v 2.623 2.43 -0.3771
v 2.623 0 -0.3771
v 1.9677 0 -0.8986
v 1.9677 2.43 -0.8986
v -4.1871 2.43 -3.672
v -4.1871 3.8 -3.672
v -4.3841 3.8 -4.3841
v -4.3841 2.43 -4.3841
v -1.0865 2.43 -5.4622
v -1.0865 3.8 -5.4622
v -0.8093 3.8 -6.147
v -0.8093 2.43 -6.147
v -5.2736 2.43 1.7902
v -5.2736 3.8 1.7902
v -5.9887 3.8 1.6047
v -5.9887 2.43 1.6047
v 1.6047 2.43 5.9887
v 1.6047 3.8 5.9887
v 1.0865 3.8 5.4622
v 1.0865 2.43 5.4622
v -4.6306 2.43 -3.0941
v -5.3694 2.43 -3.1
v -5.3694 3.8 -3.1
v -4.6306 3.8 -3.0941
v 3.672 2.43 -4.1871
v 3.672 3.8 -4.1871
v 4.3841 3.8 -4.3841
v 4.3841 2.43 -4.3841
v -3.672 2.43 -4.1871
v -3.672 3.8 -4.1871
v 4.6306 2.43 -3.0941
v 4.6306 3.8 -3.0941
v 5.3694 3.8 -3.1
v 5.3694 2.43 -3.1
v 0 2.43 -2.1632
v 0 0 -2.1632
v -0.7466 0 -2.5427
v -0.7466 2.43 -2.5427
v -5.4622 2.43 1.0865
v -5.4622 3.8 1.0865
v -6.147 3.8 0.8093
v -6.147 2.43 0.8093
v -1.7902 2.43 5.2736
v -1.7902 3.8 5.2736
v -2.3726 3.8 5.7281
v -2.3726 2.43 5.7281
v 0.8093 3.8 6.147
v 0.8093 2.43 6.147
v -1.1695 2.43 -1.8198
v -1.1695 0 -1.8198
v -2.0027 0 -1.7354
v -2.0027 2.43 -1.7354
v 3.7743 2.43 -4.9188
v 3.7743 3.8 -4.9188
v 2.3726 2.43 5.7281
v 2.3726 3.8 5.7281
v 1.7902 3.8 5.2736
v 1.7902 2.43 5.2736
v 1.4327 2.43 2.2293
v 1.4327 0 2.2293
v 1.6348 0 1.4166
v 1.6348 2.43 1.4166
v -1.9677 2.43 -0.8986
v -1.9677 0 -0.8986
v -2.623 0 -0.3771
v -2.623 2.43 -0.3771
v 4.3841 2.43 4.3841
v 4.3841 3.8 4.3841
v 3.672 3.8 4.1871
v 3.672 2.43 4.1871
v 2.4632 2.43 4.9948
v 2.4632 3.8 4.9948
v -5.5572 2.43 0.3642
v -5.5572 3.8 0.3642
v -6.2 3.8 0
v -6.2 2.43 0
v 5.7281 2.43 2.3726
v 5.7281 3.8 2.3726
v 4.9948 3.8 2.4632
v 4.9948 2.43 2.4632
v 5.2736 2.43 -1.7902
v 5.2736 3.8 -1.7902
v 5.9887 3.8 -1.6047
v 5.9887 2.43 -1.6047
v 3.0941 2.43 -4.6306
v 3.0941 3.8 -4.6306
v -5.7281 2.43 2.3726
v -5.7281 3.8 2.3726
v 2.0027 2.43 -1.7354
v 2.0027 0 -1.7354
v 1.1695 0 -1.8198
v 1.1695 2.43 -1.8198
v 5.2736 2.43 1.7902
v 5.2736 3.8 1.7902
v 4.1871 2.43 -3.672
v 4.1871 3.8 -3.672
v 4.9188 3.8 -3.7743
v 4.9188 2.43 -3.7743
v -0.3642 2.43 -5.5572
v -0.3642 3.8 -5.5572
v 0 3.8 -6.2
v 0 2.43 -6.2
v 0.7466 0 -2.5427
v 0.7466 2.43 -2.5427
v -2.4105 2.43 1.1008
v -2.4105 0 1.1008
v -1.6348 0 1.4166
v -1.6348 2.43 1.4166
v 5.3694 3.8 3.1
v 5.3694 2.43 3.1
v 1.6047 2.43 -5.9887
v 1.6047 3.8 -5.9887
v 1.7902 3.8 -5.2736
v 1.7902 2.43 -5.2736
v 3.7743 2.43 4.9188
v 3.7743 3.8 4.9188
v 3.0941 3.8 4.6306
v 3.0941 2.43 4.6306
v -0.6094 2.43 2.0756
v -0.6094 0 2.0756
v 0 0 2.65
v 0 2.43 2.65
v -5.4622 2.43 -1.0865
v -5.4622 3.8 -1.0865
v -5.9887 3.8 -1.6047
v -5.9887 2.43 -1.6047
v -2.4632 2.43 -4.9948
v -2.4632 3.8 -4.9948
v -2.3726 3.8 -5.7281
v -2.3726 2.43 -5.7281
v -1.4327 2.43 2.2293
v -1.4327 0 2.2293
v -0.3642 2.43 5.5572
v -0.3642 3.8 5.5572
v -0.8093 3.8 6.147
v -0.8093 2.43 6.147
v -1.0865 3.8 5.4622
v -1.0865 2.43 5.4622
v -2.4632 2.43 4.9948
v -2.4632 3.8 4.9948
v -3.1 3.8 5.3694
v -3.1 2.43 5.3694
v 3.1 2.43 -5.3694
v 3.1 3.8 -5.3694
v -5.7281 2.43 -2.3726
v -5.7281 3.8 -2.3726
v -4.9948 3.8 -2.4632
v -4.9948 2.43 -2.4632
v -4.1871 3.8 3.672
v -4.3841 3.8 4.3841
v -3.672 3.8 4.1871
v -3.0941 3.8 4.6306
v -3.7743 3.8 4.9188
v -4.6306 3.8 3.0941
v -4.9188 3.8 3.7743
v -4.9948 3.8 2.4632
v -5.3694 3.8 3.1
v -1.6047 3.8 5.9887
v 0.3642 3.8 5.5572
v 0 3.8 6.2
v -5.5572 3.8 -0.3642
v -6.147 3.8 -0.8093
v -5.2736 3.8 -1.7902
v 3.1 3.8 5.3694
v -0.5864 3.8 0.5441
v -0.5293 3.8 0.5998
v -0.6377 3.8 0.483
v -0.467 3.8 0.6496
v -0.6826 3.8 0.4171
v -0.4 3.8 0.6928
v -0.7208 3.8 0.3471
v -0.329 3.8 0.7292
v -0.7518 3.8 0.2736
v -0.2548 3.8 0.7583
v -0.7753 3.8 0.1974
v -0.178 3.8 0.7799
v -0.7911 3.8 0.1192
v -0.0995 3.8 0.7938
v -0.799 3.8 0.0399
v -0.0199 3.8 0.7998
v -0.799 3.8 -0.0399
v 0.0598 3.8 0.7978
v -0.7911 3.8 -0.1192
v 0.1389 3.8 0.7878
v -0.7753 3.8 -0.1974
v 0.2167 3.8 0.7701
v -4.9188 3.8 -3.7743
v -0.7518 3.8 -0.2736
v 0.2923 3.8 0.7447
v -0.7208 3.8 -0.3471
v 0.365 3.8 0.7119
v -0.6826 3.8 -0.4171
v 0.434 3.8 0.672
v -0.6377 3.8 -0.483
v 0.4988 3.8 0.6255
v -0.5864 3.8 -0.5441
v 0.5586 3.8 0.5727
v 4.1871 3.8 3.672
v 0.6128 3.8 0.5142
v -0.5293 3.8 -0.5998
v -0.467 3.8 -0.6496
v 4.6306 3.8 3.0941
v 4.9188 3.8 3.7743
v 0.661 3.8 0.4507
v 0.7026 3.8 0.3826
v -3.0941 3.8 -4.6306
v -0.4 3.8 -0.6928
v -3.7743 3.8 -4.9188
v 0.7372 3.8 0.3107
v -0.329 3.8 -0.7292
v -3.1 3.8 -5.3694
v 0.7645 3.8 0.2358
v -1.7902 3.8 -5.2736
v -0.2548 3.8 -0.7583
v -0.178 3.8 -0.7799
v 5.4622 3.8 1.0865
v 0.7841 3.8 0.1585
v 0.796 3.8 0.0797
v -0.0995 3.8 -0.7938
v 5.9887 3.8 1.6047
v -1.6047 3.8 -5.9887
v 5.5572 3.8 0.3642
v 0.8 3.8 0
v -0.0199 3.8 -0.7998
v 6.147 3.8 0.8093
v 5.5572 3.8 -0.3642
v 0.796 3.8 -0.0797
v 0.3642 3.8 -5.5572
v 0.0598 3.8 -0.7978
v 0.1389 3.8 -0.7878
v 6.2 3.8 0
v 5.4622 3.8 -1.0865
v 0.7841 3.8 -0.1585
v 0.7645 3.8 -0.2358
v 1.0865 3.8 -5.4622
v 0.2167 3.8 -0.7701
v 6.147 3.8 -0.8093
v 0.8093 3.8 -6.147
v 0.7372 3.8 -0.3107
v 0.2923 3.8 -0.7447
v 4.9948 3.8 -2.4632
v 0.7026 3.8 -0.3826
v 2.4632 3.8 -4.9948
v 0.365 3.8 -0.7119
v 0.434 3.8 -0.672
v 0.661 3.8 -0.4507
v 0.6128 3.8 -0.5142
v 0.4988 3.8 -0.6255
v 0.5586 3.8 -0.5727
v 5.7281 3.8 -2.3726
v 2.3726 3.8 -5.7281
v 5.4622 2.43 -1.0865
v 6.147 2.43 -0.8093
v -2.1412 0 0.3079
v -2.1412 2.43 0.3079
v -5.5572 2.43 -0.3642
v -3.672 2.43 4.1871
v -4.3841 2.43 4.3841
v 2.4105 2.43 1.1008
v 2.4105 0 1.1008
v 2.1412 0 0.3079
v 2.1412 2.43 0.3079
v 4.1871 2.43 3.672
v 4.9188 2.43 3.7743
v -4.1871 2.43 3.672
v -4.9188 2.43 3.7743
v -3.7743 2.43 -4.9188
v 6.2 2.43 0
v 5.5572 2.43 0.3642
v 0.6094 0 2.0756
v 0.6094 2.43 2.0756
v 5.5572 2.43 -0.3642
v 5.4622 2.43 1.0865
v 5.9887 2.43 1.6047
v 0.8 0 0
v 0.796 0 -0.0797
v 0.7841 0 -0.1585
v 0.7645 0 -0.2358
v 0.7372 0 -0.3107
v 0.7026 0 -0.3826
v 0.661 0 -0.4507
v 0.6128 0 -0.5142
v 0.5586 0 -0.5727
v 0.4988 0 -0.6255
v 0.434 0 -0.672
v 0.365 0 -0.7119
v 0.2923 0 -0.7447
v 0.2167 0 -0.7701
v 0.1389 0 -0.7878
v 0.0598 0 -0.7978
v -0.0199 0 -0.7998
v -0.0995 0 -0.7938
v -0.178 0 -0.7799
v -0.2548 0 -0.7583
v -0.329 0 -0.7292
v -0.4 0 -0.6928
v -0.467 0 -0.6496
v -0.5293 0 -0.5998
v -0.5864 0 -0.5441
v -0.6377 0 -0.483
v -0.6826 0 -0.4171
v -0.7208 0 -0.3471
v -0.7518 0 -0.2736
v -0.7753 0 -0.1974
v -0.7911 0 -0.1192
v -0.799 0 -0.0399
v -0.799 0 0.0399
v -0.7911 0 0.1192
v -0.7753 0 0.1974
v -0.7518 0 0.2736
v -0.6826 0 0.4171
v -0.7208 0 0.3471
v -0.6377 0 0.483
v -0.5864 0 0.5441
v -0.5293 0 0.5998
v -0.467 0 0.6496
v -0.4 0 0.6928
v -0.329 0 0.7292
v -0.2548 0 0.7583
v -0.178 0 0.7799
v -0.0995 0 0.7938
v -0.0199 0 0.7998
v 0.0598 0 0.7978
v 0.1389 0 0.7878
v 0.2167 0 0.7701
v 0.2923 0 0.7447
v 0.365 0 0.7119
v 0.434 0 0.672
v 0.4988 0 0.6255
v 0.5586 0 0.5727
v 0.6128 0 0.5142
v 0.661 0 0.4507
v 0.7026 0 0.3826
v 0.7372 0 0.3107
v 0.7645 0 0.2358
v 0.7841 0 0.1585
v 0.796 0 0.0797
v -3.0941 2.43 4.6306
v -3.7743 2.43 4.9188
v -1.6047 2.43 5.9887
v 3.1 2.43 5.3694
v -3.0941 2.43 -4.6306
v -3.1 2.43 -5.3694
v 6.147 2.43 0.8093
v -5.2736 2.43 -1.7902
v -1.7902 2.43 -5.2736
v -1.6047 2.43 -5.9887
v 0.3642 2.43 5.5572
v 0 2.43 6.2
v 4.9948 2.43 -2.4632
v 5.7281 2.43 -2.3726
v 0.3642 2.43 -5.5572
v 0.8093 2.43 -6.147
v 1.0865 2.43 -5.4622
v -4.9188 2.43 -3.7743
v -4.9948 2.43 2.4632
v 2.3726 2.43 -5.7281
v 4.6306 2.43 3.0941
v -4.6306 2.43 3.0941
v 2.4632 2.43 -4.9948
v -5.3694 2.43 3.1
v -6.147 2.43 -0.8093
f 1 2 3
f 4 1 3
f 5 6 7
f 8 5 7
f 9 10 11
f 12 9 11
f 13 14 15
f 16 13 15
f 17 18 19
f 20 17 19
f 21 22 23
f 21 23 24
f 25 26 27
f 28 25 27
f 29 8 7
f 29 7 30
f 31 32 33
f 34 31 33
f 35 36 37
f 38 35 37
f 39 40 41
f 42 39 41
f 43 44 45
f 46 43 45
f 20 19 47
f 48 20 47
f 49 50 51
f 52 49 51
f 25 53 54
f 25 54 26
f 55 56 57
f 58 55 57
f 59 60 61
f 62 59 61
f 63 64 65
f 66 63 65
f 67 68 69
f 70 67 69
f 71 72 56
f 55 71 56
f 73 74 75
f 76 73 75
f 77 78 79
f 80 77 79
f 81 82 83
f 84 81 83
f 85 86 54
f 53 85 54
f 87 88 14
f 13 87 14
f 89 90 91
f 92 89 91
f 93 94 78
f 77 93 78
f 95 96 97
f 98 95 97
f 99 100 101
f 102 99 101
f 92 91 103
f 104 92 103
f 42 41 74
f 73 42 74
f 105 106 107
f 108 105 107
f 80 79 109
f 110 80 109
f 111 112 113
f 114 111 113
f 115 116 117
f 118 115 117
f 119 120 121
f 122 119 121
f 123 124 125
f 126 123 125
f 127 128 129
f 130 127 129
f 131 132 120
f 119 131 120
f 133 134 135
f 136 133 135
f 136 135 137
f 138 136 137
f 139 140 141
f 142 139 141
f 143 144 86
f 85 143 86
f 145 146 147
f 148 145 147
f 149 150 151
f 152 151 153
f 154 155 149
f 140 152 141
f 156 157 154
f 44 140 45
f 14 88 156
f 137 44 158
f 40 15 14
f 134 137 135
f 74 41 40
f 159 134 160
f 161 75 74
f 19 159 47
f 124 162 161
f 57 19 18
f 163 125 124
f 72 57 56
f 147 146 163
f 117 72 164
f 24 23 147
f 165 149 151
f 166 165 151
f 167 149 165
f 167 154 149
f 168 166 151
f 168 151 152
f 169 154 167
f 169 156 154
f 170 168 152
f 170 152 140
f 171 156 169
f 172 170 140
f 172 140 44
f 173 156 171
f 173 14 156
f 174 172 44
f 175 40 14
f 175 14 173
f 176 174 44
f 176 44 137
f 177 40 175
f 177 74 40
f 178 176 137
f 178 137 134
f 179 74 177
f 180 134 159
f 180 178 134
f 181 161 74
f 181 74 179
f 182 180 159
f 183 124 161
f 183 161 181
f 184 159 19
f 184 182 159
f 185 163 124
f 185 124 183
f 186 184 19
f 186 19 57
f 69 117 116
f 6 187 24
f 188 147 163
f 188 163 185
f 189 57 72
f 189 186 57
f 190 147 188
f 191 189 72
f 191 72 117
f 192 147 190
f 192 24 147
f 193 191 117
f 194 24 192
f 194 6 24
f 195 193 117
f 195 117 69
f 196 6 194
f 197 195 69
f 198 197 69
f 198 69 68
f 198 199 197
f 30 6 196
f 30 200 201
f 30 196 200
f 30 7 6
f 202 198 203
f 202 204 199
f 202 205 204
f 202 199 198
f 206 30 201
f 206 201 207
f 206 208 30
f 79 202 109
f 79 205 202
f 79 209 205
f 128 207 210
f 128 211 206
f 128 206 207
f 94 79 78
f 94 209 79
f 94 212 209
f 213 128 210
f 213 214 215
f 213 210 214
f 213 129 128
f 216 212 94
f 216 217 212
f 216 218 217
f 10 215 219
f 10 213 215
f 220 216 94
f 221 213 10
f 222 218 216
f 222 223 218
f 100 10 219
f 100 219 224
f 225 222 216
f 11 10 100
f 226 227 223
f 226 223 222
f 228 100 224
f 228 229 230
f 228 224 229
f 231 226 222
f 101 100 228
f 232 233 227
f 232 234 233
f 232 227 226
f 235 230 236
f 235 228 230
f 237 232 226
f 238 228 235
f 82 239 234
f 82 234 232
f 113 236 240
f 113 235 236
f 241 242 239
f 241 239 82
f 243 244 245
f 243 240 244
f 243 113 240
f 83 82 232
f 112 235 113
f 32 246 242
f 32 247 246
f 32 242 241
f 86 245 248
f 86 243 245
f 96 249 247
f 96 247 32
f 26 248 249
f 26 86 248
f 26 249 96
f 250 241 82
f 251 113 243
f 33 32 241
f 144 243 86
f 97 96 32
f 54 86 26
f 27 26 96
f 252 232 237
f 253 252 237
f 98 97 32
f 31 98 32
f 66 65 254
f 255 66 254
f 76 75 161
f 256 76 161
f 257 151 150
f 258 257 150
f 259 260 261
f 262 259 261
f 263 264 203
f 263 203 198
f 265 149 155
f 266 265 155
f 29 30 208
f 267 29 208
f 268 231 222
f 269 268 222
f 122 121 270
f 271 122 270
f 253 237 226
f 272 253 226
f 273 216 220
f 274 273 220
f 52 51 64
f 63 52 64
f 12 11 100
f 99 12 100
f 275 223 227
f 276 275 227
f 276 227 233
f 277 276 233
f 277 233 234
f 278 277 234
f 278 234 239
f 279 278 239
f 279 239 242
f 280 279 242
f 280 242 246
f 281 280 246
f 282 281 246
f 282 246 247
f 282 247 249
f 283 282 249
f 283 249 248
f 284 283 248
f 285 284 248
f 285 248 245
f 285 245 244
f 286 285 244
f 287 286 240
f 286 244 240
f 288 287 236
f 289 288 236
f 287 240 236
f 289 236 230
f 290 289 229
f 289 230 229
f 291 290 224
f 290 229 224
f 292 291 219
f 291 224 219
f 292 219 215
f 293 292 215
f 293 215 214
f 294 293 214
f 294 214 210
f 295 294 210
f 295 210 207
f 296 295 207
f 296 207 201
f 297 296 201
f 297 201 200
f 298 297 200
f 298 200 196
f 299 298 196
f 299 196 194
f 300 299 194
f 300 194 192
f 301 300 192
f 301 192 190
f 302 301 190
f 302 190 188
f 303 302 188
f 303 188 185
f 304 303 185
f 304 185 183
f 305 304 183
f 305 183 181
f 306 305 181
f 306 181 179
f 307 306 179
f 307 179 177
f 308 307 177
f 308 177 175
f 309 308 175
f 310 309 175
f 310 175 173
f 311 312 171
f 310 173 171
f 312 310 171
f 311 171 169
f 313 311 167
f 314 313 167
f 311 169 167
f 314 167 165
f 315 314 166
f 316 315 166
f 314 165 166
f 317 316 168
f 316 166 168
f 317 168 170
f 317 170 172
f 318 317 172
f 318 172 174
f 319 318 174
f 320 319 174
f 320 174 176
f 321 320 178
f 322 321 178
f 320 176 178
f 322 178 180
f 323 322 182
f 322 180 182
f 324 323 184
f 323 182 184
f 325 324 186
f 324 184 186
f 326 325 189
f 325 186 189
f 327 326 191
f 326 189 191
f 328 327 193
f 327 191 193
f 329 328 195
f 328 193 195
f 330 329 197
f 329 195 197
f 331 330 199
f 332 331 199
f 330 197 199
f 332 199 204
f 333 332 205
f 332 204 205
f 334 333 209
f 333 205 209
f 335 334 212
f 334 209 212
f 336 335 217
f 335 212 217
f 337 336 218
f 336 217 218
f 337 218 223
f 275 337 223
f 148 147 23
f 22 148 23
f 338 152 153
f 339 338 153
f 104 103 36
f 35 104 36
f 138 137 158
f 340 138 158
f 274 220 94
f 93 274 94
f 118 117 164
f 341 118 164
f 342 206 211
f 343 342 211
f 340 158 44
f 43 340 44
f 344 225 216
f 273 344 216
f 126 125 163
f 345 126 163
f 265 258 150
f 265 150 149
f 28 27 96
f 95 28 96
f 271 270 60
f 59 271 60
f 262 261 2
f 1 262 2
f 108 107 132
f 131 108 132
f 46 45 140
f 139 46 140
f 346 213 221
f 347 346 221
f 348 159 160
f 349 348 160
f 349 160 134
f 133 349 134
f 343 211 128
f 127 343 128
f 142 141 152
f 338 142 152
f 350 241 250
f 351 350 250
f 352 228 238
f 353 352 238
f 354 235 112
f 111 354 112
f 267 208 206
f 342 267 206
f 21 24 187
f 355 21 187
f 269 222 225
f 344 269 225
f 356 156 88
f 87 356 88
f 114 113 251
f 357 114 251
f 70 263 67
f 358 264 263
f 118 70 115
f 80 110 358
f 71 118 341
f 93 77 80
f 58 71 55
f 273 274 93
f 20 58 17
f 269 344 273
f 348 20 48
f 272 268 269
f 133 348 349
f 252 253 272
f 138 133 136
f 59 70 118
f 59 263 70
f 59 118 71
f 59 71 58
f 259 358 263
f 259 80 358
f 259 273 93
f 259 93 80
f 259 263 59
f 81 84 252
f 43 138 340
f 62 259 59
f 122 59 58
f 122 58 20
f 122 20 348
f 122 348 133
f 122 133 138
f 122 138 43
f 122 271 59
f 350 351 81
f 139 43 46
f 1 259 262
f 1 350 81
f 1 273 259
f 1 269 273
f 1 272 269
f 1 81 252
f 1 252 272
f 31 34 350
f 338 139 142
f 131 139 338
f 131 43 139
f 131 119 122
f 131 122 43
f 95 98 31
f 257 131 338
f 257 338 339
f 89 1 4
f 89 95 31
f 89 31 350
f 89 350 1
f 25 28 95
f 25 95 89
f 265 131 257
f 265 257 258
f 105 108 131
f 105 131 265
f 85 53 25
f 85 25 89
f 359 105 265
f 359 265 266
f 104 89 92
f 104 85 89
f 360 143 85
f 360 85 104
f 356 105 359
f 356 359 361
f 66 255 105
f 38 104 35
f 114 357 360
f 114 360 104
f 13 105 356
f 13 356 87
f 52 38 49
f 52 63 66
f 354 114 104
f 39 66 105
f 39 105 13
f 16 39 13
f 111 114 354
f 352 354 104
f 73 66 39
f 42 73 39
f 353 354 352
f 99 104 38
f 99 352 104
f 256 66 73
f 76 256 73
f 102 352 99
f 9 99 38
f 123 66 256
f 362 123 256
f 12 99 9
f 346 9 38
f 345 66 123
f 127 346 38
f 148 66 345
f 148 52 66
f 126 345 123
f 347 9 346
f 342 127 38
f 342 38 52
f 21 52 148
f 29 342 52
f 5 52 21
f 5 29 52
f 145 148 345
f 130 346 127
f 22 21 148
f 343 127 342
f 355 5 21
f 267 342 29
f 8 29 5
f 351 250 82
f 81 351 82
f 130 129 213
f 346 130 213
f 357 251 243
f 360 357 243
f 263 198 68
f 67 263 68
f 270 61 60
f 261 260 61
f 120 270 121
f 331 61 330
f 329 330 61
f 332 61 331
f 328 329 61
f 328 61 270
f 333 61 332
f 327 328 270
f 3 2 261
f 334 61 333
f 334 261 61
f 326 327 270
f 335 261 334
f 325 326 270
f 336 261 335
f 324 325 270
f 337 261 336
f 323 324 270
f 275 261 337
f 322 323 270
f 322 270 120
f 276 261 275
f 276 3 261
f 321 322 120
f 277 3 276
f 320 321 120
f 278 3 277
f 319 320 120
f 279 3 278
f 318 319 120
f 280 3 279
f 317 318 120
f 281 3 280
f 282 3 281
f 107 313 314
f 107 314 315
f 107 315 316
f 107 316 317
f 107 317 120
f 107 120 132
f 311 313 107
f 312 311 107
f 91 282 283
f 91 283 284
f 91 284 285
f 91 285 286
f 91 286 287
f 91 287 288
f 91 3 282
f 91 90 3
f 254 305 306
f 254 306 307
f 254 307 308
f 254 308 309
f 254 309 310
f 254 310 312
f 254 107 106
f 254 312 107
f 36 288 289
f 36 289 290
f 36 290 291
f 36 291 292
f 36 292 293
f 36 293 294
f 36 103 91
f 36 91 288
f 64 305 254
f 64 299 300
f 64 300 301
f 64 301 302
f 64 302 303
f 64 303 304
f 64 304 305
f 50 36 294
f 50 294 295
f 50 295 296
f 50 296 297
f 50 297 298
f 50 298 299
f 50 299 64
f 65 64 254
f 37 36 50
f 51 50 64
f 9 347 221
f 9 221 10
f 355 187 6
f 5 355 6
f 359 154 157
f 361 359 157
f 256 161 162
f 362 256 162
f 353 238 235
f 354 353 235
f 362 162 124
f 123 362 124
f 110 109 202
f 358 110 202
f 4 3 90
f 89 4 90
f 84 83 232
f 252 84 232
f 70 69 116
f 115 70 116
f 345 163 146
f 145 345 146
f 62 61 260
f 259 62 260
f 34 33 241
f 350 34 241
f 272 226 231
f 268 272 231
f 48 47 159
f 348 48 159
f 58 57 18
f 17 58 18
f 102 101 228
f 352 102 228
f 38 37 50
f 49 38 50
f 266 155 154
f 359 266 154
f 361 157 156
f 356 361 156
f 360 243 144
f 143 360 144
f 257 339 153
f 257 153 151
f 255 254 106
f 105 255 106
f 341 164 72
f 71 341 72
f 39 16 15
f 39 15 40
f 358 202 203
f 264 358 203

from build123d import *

# Parameters (mm, degrees)
SKETCH2_R          = 0.8
CUT_EXTRUDE1_DEPTH = 4.8
CUT_EXTRUDE2_DEPTH = 4.8
CIRPATTERN1_COUNT  = 48
CUT_EXTRUDE3_DEPTH = 2.43
CIRPATTERN2_COUNT  = 11


with BuildPart() as part:
    # Sketch1 → Revolve1 (revolve)
    with BuildSketch(Plane.XY):
        Polygon((-6.2, 3.8), (-6.2, 2.43), (-2.65, 2.43), (-2.65, 0), (0, 0), (0, 3.8), align=None)
    revolve(axis=Axis((0, 3.8, 0), (0, -1, 0)))

    # Sketch2 → Cut-Extrude1 (cut, through all)
    with BuildSketch(Plane(origin=(0, 3.8, 0), x_dir=(1, 0, 0), z_dir=(0, 1, 0))):
        Circle(SKETCH2_R)
    extrude(amount=-CUT_EXTRUDE1_DEPTH, mode=Mode.SUBTRACT)

    # Sketch3 → Cut-Extrude2 (cut, through all)
    with BuildSketch(Plane(origin=(0, 3.8, 0), x_dir=(1, 0, 0), z_dir=(0, 1, 0))):
        with BuildLine():
            Line((0, 6.2), (0.364241202, 5.557246845))
            Line((0.364241202, 5.557246845), (0.809262392, 6.146958141))
            ThreePointArc((0.809262392, 6.146958141), (0.405499401, 6.186725324), (0, 6.2))
        make_face()
    cut_extrude2 = extrude(amount=-CUT_EXTRUDE2_DEPTH, mode=Mode.SUBTRACT)

    # CirPattern1: Cut-Extrude2 ×48 about axis
    cirpattern1_axis = Axis((0, 0, 0), (0, 1, 0))
    for i in range(1, CIRPATTERN1_COUNT):
        add(cut_extrude2.rotate(cirpattern1_axis, i * 360 / CIRPATTERN1_COUNT), mode=Mode.SUBTRACT)

    # Sketch4 → Cut-Extrude3 (cut)
    with BuildSketch(Plane.XZ):
        with BuildLine():
            Line((0, 2.65), (0.609443257, 2.075573123))
            Line((0.609443257, 2.075573123), (1.432698166, 2.229321862))
            ThreePointArc((1.432698166, 2.229321862), (0.746591276, 2.54265638), (0, 2.65))
        make_face()
    cut_extrude3 = extrude(amount=-CUT_EXTRUDE3_DEPTH, mode=Mode.SUBTRACT)

    # CirPattern2: Cut-Extrude3 ×11 about axis
    cirpattern2_axis = Axis((0, 0, 0), (0, 1, 0))
    for i in range(1, CIRPATTERN2_COUNT):
        add(cut_extrude3.rotate(cirpattern2_axis, i * 360 / CIRPATTERN2_COUNT), mode=Mode.SUBTRACT)


solid = part.part
